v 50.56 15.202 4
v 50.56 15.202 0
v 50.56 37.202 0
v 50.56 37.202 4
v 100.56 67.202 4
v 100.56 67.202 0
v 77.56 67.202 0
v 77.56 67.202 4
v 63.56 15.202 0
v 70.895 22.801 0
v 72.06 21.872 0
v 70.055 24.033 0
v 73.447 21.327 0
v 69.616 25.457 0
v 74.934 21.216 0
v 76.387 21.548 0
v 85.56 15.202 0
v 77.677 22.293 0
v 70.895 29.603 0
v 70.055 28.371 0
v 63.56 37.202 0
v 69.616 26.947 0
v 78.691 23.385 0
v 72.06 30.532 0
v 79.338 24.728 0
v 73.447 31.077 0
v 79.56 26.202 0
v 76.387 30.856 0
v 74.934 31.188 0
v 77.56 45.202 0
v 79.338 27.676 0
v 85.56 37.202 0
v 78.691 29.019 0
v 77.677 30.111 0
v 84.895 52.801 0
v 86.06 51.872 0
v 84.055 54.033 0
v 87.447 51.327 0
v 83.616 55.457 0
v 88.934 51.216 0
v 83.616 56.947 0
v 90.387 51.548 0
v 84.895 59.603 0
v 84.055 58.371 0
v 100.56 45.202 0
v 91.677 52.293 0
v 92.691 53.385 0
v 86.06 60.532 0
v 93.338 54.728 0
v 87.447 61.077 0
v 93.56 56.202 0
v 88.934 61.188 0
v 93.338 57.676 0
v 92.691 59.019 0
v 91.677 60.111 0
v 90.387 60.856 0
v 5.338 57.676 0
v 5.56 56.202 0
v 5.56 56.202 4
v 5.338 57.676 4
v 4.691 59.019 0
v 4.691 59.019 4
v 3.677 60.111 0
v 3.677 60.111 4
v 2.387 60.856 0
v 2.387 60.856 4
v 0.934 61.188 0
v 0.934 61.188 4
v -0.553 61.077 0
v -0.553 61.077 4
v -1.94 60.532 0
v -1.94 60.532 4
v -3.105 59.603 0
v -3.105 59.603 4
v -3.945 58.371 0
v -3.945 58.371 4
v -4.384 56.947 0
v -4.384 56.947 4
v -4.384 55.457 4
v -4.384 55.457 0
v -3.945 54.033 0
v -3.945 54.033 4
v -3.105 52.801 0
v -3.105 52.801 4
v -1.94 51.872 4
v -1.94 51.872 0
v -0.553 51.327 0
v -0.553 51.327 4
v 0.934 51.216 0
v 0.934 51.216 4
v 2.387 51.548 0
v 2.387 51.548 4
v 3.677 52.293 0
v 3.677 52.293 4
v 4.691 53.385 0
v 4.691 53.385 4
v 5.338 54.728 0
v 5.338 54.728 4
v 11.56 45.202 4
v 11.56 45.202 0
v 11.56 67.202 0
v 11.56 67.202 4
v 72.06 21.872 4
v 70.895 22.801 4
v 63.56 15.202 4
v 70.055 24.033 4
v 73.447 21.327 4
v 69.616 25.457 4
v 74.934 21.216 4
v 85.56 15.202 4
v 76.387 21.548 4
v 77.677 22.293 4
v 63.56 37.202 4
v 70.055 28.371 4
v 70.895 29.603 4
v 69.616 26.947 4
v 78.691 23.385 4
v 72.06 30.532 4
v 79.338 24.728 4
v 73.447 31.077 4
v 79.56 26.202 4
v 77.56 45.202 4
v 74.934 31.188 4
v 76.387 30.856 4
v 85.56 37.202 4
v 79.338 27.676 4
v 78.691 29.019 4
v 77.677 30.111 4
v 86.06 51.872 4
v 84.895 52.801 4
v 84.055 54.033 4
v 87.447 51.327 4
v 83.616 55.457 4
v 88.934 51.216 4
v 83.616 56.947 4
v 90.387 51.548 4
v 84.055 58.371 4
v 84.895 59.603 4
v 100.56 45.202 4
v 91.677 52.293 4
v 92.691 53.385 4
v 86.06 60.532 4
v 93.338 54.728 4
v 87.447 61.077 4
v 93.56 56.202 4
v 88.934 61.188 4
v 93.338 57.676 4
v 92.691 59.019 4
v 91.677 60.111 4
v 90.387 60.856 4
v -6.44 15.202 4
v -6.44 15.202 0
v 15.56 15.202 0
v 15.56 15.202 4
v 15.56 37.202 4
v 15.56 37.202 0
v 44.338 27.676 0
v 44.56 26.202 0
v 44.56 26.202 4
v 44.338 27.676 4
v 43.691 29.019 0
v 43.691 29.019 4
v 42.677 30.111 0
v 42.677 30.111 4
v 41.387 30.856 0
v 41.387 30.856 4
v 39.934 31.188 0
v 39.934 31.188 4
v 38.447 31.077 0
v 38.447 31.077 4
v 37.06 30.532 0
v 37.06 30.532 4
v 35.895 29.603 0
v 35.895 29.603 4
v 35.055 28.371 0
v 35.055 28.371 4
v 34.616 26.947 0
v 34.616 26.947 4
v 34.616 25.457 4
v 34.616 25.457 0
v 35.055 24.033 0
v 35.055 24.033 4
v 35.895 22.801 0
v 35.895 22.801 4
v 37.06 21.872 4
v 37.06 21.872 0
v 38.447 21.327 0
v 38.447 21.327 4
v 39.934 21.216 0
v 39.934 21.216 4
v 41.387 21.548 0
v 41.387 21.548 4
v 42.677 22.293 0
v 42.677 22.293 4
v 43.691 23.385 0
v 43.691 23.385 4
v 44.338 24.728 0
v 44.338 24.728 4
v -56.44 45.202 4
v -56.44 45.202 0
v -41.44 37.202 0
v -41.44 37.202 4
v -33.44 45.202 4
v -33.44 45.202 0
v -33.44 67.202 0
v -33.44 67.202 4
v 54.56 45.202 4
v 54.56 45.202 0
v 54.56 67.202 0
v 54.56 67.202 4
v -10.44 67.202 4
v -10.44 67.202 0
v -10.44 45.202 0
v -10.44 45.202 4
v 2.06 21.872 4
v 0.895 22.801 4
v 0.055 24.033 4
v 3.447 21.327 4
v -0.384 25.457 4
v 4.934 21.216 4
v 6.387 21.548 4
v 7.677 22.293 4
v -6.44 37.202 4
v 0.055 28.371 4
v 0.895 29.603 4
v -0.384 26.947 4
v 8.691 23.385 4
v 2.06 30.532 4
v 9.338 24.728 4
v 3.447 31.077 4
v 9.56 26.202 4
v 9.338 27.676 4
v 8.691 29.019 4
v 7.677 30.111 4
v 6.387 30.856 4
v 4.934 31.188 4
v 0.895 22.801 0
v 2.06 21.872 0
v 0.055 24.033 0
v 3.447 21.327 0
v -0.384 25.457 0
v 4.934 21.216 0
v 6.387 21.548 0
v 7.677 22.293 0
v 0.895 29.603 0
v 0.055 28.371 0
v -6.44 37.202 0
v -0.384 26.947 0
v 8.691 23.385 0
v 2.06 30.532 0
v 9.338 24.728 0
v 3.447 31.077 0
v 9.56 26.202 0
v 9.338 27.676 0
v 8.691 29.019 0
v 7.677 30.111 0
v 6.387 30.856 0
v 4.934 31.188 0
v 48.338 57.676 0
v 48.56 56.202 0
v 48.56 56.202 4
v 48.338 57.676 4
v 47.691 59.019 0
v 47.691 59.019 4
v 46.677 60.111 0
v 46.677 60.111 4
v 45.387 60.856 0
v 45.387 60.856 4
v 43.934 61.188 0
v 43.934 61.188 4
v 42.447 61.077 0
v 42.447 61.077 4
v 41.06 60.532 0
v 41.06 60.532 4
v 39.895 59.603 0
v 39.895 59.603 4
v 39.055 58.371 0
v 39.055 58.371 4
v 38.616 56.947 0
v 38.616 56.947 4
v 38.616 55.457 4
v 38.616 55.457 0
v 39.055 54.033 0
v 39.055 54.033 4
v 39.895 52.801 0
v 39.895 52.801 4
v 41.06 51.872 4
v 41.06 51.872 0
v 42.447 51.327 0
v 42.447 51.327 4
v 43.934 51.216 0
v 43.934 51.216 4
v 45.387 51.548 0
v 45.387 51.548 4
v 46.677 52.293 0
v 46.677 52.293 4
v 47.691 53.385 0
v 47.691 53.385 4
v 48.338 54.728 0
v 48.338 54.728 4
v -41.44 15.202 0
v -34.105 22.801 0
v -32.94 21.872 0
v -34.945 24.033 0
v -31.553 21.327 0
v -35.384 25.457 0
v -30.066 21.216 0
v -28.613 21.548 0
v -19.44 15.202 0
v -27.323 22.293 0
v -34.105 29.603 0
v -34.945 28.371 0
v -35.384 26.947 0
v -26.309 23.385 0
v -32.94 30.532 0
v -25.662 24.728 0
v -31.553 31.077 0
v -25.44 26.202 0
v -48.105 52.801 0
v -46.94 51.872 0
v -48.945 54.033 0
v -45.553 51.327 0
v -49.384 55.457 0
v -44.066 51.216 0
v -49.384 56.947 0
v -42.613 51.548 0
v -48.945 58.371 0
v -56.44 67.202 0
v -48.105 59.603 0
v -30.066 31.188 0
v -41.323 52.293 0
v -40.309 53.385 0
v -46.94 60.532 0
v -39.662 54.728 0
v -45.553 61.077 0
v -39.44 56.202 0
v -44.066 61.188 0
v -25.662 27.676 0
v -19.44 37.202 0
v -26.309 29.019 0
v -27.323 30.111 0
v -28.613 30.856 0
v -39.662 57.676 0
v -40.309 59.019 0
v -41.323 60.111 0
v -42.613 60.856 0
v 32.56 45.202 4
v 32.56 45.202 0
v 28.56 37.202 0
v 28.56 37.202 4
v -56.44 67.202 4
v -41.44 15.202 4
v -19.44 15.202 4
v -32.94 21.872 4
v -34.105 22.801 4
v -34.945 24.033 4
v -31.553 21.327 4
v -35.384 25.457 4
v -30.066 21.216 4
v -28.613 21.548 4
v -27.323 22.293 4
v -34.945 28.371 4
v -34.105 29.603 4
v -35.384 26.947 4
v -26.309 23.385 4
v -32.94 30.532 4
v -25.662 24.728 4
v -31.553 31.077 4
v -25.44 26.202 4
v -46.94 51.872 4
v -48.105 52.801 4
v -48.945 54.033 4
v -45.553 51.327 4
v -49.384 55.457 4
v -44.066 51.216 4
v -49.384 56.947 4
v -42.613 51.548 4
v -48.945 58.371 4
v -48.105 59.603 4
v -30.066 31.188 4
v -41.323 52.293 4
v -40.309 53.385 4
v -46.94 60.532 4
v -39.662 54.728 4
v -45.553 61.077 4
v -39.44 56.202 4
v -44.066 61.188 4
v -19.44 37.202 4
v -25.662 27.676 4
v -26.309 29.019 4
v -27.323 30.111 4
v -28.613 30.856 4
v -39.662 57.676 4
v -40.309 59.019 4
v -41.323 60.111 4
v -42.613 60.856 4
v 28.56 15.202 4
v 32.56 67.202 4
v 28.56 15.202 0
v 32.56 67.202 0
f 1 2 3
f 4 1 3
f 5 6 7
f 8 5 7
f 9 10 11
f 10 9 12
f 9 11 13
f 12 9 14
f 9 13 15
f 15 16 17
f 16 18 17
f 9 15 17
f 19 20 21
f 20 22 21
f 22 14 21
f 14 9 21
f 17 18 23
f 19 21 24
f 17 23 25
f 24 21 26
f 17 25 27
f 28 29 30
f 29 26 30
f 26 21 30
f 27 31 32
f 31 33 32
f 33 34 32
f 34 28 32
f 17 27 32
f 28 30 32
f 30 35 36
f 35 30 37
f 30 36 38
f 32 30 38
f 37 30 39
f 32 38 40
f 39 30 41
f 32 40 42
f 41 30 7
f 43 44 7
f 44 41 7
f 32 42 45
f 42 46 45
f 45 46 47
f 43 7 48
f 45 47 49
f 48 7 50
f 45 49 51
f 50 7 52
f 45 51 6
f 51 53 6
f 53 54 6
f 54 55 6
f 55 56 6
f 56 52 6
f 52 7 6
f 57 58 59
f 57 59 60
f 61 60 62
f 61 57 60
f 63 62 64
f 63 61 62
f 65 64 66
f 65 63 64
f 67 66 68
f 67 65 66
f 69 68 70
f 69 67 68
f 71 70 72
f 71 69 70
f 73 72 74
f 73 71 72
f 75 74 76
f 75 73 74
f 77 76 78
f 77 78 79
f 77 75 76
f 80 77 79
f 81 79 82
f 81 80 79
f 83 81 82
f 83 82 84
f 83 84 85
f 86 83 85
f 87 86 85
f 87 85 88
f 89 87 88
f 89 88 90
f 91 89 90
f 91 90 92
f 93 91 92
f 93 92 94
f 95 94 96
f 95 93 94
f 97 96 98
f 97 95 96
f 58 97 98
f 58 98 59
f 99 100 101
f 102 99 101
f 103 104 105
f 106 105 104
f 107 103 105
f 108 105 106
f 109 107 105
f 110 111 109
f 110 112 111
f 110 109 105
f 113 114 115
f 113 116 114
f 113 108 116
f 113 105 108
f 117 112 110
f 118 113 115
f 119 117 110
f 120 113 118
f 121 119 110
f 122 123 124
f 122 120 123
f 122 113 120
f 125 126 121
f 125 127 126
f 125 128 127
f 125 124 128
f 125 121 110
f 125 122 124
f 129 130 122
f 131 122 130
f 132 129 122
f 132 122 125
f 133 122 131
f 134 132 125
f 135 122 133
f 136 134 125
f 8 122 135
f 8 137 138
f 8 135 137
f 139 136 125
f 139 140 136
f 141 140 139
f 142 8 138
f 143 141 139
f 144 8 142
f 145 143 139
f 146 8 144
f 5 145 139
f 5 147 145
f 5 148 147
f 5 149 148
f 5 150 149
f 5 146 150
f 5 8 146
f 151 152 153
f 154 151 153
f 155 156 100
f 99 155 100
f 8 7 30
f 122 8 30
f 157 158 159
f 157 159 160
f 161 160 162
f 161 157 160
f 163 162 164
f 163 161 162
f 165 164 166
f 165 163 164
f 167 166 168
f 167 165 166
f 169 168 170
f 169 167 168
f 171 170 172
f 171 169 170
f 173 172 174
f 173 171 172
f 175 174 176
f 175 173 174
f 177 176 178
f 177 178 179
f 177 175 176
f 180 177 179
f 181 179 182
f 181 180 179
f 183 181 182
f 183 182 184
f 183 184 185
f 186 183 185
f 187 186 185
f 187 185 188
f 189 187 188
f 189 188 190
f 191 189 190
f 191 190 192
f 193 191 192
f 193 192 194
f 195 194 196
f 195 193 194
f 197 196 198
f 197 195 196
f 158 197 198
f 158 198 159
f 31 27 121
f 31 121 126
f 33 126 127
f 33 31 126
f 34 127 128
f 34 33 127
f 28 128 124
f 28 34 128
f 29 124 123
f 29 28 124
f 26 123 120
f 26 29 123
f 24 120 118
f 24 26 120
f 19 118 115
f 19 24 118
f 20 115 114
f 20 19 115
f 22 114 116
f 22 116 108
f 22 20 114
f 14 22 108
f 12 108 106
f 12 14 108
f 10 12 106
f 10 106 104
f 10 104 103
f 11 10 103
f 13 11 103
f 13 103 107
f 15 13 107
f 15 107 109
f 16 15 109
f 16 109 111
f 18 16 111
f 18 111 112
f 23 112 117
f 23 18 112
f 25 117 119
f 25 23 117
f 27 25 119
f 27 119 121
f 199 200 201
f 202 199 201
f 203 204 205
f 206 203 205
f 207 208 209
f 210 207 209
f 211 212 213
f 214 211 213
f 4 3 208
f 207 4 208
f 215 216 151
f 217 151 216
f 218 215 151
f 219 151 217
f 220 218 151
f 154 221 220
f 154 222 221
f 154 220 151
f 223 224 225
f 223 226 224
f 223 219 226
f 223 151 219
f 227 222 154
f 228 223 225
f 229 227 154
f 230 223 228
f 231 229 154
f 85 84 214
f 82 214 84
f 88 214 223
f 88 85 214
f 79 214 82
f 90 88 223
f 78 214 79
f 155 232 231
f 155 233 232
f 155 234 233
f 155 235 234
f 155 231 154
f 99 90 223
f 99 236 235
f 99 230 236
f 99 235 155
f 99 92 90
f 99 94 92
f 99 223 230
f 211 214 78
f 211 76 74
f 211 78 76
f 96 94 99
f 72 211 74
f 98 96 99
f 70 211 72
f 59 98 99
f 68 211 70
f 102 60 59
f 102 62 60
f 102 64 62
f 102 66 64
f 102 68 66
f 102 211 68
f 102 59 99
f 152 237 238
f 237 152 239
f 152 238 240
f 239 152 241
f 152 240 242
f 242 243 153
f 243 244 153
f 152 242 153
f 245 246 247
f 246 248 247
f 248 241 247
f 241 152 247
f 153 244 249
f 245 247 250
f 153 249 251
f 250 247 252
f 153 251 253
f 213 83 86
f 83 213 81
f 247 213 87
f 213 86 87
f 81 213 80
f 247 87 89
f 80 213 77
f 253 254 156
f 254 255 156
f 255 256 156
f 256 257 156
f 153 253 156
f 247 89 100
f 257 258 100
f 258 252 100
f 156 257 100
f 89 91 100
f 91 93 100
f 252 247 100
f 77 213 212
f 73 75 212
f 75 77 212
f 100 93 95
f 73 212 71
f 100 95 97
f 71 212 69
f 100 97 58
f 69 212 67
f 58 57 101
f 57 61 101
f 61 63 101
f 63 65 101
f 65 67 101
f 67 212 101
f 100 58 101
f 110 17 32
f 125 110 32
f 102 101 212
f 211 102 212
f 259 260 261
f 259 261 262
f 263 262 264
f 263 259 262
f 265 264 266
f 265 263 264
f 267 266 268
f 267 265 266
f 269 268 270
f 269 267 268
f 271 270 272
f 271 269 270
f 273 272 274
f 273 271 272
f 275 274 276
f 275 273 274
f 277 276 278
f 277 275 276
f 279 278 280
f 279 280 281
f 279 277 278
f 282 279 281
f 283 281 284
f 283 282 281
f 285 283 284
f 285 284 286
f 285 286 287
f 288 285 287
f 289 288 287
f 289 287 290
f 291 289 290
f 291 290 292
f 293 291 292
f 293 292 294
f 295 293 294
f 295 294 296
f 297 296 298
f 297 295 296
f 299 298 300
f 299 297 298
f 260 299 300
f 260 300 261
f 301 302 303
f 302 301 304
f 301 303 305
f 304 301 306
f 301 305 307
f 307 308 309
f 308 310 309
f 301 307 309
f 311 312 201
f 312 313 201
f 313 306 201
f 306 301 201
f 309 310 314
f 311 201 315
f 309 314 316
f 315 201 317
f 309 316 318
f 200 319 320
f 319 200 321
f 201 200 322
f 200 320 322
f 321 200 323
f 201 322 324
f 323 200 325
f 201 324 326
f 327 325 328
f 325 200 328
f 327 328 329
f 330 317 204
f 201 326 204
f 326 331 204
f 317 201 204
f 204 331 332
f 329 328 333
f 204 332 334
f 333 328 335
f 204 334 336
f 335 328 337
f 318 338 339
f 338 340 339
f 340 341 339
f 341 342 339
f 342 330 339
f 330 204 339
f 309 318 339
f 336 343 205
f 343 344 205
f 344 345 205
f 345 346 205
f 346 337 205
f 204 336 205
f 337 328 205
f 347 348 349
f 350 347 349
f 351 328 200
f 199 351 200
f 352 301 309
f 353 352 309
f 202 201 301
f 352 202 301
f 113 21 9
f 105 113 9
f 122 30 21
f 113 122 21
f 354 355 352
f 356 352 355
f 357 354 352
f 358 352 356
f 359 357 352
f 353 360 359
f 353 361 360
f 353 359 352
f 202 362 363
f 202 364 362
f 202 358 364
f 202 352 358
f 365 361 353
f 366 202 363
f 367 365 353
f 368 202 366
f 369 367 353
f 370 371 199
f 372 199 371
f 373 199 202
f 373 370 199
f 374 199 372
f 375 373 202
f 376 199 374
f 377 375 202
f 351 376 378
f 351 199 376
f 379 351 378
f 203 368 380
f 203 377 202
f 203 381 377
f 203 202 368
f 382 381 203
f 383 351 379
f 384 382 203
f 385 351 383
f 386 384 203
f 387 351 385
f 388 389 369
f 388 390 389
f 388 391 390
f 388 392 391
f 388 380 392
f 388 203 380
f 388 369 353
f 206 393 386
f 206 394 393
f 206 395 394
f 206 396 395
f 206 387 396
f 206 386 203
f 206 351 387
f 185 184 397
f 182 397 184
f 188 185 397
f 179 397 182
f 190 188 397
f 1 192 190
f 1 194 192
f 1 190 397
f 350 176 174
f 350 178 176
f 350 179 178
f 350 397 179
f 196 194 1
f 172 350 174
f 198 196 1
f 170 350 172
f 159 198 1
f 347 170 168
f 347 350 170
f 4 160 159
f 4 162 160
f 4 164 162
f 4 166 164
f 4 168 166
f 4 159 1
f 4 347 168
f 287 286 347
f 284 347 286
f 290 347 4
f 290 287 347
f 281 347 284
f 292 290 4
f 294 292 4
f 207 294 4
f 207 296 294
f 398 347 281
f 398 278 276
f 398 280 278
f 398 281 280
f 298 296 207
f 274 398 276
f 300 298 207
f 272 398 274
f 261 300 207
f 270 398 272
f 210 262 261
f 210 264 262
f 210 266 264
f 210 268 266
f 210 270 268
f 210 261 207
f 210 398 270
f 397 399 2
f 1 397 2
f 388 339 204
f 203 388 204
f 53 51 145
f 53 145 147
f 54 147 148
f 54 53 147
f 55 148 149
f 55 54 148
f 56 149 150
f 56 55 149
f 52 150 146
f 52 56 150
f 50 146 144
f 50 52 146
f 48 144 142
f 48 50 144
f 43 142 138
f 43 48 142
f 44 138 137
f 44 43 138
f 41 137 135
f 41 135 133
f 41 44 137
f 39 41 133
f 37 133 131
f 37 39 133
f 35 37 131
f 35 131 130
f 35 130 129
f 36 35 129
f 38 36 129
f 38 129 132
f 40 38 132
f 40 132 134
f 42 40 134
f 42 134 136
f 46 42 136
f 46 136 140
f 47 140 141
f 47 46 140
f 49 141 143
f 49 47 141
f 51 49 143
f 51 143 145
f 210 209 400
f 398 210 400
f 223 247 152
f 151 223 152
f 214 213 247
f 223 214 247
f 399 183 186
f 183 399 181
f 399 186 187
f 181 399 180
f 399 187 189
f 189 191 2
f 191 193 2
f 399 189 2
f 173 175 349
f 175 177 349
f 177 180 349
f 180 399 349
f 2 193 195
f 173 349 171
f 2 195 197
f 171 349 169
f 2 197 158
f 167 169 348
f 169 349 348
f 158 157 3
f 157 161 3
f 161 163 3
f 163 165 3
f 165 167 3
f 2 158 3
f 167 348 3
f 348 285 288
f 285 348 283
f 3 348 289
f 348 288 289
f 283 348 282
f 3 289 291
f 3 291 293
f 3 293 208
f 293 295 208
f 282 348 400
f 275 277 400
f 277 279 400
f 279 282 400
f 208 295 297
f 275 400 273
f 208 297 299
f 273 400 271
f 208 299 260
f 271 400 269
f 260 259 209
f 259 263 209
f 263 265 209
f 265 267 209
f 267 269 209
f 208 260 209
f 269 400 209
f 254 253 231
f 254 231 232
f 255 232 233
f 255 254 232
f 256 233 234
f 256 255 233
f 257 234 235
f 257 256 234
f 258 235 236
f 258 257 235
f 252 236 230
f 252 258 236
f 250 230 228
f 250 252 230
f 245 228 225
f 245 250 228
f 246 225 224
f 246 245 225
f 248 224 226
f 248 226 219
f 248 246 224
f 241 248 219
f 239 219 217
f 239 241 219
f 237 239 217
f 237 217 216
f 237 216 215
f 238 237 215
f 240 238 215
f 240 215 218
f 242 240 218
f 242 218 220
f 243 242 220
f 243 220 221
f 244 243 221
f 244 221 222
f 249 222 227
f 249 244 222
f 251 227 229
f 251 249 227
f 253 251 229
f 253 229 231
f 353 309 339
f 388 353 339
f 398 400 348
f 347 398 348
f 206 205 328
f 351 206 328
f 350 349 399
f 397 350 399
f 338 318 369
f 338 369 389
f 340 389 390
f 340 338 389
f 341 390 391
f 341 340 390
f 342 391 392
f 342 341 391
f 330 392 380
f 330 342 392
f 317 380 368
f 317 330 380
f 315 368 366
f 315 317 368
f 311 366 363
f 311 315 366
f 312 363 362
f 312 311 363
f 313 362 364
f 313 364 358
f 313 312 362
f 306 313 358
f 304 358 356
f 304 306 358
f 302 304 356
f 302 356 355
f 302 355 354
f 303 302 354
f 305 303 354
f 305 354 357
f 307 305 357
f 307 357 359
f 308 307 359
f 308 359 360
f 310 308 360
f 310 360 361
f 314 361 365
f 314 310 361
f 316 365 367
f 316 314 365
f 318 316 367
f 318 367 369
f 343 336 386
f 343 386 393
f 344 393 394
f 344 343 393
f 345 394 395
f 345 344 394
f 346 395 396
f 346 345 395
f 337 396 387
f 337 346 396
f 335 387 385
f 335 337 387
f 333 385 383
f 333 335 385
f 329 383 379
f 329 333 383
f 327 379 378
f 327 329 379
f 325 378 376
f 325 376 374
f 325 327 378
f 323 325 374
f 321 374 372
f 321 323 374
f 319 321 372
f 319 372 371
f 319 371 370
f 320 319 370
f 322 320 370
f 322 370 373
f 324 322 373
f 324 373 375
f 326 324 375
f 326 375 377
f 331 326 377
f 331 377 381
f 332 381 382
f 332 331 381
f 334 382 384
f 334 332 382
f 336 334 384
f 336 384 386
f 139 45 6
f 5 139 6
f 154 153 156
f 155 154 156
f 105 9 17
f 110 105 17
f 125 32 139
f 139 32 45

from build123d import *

# Parameters (mm, degrees)
F0_R     = 5
F1_DEPTH = 4


# Not quite as in the source:
# - a feature names something its author has since deleted; it is built from what else it names


with BuildPart() as f1:
    # F0 (on Top) → F1 (new body)
    with BuildSketch(Plane.XY):
        Polygon((-33.4400572926, 67.2019907534), (-56.4400572926, 67.2019907534), (-56.4400572926, 45.2019907534), (-41.4400572926, 37.2019907534), (-41.4400572926, 15.2019907534), (-19.4400572926, 15.2019907534), (-19.4400572926, 37.2019907534), (-33.4400572926, 45.2019907534), align=None)
        with Locations((-30.4400572926, 26.2019907534)):
            Circle(F0_R, mode=Mode.SUBTRACT)
        with Locations((-44.4400572926, 56.2019907534)):
            Circle(F0_R, mode=Mode.SUBTRACT)
    extrude(amount=F1_DEPTH)


with BuildPart() as f1b:
    # F0 (on Top) → F1, piece 2 (new body)
    with BuildSketch(Plane.XY):
        Polygon((11.5599427074, 67.2019907534), (-10.4400572926, 67.2019907534), (-10.4400572926, 45.2019907534), (-6.4400572926, 37.2019907534), (-6.4400572926, 15.2019907534), (15.5599427074, 15.2019907534), (15.5599427074, 25.1399558038), (15.5599427074, 37.2019907534), (11.5599427074, 45.2019907534), align=None)
        with Locations((4.5599427074, 26.2019907534)):
            Circle(F0_R, mode=Mode.SUBTRACT)
        with Locations((0.5599427074, 56.2019907534)):
            Circle(F0_R, mode=Mode.SUBTRACT)
    extrude(amount=F1_DEPTH)


with BuildPart() as f1c:
    # F0 (on Top) → F1, piece 3 (new body)
    with BuildSketch(Plane.XY):
        Polygon((28.5599427074, 15.2019907534), (50.5599427074, 15.2019907534), (50.5599427074, 37.2019907534), (54.5599427074, 45.2019907534), (54.5599427074, 67.2019907534), (32.5599427074, 67.2019907534), (32.5599427074, 45.2019907534), (28.5599427074, 37.2019907534), align=None)
        with Locations((39.5599427074, 26.2019907534)):
            Circle(F0_R, mode=Mode.SUBTRACT)
        with Locations((43.5599427074, 56.2019907534)):
            Circle(F0_R, mode=Mode.SUBTRACT)
    extrude(amount=F1_DEPTH)


with BuildPart() as f1d:
    # F0 (on Top) → F1, piece 4 (new body)
    with BuildSketch(Plane.XY):
        Polygon((77.5599427074, 67.2019907534), (77.5599427074, 45.2019907534), (63.5599427074, 37.2019907534), (63.5599427074, 15.2019907534), (85.5599427074, 15.2019907534), (85.5599427074, 37.2019907534), (100.5599427074, 45.2019907534), (100.5599427074, 67.2019907534), align=None)
        with Locations((74.5599427074, 26.2019907534)):
            Circle(F0_R, mode=Mode.SUBTRACT)
        with Locations((88.5599427074, 56.2019907534)):
            Circle(F0_R, mode=Mode.SUBTRACT)
    extrude(amount=F1_DEPTH)


solid = Compound([f1.part, f1b.part, f1c.part, f1d.part])
